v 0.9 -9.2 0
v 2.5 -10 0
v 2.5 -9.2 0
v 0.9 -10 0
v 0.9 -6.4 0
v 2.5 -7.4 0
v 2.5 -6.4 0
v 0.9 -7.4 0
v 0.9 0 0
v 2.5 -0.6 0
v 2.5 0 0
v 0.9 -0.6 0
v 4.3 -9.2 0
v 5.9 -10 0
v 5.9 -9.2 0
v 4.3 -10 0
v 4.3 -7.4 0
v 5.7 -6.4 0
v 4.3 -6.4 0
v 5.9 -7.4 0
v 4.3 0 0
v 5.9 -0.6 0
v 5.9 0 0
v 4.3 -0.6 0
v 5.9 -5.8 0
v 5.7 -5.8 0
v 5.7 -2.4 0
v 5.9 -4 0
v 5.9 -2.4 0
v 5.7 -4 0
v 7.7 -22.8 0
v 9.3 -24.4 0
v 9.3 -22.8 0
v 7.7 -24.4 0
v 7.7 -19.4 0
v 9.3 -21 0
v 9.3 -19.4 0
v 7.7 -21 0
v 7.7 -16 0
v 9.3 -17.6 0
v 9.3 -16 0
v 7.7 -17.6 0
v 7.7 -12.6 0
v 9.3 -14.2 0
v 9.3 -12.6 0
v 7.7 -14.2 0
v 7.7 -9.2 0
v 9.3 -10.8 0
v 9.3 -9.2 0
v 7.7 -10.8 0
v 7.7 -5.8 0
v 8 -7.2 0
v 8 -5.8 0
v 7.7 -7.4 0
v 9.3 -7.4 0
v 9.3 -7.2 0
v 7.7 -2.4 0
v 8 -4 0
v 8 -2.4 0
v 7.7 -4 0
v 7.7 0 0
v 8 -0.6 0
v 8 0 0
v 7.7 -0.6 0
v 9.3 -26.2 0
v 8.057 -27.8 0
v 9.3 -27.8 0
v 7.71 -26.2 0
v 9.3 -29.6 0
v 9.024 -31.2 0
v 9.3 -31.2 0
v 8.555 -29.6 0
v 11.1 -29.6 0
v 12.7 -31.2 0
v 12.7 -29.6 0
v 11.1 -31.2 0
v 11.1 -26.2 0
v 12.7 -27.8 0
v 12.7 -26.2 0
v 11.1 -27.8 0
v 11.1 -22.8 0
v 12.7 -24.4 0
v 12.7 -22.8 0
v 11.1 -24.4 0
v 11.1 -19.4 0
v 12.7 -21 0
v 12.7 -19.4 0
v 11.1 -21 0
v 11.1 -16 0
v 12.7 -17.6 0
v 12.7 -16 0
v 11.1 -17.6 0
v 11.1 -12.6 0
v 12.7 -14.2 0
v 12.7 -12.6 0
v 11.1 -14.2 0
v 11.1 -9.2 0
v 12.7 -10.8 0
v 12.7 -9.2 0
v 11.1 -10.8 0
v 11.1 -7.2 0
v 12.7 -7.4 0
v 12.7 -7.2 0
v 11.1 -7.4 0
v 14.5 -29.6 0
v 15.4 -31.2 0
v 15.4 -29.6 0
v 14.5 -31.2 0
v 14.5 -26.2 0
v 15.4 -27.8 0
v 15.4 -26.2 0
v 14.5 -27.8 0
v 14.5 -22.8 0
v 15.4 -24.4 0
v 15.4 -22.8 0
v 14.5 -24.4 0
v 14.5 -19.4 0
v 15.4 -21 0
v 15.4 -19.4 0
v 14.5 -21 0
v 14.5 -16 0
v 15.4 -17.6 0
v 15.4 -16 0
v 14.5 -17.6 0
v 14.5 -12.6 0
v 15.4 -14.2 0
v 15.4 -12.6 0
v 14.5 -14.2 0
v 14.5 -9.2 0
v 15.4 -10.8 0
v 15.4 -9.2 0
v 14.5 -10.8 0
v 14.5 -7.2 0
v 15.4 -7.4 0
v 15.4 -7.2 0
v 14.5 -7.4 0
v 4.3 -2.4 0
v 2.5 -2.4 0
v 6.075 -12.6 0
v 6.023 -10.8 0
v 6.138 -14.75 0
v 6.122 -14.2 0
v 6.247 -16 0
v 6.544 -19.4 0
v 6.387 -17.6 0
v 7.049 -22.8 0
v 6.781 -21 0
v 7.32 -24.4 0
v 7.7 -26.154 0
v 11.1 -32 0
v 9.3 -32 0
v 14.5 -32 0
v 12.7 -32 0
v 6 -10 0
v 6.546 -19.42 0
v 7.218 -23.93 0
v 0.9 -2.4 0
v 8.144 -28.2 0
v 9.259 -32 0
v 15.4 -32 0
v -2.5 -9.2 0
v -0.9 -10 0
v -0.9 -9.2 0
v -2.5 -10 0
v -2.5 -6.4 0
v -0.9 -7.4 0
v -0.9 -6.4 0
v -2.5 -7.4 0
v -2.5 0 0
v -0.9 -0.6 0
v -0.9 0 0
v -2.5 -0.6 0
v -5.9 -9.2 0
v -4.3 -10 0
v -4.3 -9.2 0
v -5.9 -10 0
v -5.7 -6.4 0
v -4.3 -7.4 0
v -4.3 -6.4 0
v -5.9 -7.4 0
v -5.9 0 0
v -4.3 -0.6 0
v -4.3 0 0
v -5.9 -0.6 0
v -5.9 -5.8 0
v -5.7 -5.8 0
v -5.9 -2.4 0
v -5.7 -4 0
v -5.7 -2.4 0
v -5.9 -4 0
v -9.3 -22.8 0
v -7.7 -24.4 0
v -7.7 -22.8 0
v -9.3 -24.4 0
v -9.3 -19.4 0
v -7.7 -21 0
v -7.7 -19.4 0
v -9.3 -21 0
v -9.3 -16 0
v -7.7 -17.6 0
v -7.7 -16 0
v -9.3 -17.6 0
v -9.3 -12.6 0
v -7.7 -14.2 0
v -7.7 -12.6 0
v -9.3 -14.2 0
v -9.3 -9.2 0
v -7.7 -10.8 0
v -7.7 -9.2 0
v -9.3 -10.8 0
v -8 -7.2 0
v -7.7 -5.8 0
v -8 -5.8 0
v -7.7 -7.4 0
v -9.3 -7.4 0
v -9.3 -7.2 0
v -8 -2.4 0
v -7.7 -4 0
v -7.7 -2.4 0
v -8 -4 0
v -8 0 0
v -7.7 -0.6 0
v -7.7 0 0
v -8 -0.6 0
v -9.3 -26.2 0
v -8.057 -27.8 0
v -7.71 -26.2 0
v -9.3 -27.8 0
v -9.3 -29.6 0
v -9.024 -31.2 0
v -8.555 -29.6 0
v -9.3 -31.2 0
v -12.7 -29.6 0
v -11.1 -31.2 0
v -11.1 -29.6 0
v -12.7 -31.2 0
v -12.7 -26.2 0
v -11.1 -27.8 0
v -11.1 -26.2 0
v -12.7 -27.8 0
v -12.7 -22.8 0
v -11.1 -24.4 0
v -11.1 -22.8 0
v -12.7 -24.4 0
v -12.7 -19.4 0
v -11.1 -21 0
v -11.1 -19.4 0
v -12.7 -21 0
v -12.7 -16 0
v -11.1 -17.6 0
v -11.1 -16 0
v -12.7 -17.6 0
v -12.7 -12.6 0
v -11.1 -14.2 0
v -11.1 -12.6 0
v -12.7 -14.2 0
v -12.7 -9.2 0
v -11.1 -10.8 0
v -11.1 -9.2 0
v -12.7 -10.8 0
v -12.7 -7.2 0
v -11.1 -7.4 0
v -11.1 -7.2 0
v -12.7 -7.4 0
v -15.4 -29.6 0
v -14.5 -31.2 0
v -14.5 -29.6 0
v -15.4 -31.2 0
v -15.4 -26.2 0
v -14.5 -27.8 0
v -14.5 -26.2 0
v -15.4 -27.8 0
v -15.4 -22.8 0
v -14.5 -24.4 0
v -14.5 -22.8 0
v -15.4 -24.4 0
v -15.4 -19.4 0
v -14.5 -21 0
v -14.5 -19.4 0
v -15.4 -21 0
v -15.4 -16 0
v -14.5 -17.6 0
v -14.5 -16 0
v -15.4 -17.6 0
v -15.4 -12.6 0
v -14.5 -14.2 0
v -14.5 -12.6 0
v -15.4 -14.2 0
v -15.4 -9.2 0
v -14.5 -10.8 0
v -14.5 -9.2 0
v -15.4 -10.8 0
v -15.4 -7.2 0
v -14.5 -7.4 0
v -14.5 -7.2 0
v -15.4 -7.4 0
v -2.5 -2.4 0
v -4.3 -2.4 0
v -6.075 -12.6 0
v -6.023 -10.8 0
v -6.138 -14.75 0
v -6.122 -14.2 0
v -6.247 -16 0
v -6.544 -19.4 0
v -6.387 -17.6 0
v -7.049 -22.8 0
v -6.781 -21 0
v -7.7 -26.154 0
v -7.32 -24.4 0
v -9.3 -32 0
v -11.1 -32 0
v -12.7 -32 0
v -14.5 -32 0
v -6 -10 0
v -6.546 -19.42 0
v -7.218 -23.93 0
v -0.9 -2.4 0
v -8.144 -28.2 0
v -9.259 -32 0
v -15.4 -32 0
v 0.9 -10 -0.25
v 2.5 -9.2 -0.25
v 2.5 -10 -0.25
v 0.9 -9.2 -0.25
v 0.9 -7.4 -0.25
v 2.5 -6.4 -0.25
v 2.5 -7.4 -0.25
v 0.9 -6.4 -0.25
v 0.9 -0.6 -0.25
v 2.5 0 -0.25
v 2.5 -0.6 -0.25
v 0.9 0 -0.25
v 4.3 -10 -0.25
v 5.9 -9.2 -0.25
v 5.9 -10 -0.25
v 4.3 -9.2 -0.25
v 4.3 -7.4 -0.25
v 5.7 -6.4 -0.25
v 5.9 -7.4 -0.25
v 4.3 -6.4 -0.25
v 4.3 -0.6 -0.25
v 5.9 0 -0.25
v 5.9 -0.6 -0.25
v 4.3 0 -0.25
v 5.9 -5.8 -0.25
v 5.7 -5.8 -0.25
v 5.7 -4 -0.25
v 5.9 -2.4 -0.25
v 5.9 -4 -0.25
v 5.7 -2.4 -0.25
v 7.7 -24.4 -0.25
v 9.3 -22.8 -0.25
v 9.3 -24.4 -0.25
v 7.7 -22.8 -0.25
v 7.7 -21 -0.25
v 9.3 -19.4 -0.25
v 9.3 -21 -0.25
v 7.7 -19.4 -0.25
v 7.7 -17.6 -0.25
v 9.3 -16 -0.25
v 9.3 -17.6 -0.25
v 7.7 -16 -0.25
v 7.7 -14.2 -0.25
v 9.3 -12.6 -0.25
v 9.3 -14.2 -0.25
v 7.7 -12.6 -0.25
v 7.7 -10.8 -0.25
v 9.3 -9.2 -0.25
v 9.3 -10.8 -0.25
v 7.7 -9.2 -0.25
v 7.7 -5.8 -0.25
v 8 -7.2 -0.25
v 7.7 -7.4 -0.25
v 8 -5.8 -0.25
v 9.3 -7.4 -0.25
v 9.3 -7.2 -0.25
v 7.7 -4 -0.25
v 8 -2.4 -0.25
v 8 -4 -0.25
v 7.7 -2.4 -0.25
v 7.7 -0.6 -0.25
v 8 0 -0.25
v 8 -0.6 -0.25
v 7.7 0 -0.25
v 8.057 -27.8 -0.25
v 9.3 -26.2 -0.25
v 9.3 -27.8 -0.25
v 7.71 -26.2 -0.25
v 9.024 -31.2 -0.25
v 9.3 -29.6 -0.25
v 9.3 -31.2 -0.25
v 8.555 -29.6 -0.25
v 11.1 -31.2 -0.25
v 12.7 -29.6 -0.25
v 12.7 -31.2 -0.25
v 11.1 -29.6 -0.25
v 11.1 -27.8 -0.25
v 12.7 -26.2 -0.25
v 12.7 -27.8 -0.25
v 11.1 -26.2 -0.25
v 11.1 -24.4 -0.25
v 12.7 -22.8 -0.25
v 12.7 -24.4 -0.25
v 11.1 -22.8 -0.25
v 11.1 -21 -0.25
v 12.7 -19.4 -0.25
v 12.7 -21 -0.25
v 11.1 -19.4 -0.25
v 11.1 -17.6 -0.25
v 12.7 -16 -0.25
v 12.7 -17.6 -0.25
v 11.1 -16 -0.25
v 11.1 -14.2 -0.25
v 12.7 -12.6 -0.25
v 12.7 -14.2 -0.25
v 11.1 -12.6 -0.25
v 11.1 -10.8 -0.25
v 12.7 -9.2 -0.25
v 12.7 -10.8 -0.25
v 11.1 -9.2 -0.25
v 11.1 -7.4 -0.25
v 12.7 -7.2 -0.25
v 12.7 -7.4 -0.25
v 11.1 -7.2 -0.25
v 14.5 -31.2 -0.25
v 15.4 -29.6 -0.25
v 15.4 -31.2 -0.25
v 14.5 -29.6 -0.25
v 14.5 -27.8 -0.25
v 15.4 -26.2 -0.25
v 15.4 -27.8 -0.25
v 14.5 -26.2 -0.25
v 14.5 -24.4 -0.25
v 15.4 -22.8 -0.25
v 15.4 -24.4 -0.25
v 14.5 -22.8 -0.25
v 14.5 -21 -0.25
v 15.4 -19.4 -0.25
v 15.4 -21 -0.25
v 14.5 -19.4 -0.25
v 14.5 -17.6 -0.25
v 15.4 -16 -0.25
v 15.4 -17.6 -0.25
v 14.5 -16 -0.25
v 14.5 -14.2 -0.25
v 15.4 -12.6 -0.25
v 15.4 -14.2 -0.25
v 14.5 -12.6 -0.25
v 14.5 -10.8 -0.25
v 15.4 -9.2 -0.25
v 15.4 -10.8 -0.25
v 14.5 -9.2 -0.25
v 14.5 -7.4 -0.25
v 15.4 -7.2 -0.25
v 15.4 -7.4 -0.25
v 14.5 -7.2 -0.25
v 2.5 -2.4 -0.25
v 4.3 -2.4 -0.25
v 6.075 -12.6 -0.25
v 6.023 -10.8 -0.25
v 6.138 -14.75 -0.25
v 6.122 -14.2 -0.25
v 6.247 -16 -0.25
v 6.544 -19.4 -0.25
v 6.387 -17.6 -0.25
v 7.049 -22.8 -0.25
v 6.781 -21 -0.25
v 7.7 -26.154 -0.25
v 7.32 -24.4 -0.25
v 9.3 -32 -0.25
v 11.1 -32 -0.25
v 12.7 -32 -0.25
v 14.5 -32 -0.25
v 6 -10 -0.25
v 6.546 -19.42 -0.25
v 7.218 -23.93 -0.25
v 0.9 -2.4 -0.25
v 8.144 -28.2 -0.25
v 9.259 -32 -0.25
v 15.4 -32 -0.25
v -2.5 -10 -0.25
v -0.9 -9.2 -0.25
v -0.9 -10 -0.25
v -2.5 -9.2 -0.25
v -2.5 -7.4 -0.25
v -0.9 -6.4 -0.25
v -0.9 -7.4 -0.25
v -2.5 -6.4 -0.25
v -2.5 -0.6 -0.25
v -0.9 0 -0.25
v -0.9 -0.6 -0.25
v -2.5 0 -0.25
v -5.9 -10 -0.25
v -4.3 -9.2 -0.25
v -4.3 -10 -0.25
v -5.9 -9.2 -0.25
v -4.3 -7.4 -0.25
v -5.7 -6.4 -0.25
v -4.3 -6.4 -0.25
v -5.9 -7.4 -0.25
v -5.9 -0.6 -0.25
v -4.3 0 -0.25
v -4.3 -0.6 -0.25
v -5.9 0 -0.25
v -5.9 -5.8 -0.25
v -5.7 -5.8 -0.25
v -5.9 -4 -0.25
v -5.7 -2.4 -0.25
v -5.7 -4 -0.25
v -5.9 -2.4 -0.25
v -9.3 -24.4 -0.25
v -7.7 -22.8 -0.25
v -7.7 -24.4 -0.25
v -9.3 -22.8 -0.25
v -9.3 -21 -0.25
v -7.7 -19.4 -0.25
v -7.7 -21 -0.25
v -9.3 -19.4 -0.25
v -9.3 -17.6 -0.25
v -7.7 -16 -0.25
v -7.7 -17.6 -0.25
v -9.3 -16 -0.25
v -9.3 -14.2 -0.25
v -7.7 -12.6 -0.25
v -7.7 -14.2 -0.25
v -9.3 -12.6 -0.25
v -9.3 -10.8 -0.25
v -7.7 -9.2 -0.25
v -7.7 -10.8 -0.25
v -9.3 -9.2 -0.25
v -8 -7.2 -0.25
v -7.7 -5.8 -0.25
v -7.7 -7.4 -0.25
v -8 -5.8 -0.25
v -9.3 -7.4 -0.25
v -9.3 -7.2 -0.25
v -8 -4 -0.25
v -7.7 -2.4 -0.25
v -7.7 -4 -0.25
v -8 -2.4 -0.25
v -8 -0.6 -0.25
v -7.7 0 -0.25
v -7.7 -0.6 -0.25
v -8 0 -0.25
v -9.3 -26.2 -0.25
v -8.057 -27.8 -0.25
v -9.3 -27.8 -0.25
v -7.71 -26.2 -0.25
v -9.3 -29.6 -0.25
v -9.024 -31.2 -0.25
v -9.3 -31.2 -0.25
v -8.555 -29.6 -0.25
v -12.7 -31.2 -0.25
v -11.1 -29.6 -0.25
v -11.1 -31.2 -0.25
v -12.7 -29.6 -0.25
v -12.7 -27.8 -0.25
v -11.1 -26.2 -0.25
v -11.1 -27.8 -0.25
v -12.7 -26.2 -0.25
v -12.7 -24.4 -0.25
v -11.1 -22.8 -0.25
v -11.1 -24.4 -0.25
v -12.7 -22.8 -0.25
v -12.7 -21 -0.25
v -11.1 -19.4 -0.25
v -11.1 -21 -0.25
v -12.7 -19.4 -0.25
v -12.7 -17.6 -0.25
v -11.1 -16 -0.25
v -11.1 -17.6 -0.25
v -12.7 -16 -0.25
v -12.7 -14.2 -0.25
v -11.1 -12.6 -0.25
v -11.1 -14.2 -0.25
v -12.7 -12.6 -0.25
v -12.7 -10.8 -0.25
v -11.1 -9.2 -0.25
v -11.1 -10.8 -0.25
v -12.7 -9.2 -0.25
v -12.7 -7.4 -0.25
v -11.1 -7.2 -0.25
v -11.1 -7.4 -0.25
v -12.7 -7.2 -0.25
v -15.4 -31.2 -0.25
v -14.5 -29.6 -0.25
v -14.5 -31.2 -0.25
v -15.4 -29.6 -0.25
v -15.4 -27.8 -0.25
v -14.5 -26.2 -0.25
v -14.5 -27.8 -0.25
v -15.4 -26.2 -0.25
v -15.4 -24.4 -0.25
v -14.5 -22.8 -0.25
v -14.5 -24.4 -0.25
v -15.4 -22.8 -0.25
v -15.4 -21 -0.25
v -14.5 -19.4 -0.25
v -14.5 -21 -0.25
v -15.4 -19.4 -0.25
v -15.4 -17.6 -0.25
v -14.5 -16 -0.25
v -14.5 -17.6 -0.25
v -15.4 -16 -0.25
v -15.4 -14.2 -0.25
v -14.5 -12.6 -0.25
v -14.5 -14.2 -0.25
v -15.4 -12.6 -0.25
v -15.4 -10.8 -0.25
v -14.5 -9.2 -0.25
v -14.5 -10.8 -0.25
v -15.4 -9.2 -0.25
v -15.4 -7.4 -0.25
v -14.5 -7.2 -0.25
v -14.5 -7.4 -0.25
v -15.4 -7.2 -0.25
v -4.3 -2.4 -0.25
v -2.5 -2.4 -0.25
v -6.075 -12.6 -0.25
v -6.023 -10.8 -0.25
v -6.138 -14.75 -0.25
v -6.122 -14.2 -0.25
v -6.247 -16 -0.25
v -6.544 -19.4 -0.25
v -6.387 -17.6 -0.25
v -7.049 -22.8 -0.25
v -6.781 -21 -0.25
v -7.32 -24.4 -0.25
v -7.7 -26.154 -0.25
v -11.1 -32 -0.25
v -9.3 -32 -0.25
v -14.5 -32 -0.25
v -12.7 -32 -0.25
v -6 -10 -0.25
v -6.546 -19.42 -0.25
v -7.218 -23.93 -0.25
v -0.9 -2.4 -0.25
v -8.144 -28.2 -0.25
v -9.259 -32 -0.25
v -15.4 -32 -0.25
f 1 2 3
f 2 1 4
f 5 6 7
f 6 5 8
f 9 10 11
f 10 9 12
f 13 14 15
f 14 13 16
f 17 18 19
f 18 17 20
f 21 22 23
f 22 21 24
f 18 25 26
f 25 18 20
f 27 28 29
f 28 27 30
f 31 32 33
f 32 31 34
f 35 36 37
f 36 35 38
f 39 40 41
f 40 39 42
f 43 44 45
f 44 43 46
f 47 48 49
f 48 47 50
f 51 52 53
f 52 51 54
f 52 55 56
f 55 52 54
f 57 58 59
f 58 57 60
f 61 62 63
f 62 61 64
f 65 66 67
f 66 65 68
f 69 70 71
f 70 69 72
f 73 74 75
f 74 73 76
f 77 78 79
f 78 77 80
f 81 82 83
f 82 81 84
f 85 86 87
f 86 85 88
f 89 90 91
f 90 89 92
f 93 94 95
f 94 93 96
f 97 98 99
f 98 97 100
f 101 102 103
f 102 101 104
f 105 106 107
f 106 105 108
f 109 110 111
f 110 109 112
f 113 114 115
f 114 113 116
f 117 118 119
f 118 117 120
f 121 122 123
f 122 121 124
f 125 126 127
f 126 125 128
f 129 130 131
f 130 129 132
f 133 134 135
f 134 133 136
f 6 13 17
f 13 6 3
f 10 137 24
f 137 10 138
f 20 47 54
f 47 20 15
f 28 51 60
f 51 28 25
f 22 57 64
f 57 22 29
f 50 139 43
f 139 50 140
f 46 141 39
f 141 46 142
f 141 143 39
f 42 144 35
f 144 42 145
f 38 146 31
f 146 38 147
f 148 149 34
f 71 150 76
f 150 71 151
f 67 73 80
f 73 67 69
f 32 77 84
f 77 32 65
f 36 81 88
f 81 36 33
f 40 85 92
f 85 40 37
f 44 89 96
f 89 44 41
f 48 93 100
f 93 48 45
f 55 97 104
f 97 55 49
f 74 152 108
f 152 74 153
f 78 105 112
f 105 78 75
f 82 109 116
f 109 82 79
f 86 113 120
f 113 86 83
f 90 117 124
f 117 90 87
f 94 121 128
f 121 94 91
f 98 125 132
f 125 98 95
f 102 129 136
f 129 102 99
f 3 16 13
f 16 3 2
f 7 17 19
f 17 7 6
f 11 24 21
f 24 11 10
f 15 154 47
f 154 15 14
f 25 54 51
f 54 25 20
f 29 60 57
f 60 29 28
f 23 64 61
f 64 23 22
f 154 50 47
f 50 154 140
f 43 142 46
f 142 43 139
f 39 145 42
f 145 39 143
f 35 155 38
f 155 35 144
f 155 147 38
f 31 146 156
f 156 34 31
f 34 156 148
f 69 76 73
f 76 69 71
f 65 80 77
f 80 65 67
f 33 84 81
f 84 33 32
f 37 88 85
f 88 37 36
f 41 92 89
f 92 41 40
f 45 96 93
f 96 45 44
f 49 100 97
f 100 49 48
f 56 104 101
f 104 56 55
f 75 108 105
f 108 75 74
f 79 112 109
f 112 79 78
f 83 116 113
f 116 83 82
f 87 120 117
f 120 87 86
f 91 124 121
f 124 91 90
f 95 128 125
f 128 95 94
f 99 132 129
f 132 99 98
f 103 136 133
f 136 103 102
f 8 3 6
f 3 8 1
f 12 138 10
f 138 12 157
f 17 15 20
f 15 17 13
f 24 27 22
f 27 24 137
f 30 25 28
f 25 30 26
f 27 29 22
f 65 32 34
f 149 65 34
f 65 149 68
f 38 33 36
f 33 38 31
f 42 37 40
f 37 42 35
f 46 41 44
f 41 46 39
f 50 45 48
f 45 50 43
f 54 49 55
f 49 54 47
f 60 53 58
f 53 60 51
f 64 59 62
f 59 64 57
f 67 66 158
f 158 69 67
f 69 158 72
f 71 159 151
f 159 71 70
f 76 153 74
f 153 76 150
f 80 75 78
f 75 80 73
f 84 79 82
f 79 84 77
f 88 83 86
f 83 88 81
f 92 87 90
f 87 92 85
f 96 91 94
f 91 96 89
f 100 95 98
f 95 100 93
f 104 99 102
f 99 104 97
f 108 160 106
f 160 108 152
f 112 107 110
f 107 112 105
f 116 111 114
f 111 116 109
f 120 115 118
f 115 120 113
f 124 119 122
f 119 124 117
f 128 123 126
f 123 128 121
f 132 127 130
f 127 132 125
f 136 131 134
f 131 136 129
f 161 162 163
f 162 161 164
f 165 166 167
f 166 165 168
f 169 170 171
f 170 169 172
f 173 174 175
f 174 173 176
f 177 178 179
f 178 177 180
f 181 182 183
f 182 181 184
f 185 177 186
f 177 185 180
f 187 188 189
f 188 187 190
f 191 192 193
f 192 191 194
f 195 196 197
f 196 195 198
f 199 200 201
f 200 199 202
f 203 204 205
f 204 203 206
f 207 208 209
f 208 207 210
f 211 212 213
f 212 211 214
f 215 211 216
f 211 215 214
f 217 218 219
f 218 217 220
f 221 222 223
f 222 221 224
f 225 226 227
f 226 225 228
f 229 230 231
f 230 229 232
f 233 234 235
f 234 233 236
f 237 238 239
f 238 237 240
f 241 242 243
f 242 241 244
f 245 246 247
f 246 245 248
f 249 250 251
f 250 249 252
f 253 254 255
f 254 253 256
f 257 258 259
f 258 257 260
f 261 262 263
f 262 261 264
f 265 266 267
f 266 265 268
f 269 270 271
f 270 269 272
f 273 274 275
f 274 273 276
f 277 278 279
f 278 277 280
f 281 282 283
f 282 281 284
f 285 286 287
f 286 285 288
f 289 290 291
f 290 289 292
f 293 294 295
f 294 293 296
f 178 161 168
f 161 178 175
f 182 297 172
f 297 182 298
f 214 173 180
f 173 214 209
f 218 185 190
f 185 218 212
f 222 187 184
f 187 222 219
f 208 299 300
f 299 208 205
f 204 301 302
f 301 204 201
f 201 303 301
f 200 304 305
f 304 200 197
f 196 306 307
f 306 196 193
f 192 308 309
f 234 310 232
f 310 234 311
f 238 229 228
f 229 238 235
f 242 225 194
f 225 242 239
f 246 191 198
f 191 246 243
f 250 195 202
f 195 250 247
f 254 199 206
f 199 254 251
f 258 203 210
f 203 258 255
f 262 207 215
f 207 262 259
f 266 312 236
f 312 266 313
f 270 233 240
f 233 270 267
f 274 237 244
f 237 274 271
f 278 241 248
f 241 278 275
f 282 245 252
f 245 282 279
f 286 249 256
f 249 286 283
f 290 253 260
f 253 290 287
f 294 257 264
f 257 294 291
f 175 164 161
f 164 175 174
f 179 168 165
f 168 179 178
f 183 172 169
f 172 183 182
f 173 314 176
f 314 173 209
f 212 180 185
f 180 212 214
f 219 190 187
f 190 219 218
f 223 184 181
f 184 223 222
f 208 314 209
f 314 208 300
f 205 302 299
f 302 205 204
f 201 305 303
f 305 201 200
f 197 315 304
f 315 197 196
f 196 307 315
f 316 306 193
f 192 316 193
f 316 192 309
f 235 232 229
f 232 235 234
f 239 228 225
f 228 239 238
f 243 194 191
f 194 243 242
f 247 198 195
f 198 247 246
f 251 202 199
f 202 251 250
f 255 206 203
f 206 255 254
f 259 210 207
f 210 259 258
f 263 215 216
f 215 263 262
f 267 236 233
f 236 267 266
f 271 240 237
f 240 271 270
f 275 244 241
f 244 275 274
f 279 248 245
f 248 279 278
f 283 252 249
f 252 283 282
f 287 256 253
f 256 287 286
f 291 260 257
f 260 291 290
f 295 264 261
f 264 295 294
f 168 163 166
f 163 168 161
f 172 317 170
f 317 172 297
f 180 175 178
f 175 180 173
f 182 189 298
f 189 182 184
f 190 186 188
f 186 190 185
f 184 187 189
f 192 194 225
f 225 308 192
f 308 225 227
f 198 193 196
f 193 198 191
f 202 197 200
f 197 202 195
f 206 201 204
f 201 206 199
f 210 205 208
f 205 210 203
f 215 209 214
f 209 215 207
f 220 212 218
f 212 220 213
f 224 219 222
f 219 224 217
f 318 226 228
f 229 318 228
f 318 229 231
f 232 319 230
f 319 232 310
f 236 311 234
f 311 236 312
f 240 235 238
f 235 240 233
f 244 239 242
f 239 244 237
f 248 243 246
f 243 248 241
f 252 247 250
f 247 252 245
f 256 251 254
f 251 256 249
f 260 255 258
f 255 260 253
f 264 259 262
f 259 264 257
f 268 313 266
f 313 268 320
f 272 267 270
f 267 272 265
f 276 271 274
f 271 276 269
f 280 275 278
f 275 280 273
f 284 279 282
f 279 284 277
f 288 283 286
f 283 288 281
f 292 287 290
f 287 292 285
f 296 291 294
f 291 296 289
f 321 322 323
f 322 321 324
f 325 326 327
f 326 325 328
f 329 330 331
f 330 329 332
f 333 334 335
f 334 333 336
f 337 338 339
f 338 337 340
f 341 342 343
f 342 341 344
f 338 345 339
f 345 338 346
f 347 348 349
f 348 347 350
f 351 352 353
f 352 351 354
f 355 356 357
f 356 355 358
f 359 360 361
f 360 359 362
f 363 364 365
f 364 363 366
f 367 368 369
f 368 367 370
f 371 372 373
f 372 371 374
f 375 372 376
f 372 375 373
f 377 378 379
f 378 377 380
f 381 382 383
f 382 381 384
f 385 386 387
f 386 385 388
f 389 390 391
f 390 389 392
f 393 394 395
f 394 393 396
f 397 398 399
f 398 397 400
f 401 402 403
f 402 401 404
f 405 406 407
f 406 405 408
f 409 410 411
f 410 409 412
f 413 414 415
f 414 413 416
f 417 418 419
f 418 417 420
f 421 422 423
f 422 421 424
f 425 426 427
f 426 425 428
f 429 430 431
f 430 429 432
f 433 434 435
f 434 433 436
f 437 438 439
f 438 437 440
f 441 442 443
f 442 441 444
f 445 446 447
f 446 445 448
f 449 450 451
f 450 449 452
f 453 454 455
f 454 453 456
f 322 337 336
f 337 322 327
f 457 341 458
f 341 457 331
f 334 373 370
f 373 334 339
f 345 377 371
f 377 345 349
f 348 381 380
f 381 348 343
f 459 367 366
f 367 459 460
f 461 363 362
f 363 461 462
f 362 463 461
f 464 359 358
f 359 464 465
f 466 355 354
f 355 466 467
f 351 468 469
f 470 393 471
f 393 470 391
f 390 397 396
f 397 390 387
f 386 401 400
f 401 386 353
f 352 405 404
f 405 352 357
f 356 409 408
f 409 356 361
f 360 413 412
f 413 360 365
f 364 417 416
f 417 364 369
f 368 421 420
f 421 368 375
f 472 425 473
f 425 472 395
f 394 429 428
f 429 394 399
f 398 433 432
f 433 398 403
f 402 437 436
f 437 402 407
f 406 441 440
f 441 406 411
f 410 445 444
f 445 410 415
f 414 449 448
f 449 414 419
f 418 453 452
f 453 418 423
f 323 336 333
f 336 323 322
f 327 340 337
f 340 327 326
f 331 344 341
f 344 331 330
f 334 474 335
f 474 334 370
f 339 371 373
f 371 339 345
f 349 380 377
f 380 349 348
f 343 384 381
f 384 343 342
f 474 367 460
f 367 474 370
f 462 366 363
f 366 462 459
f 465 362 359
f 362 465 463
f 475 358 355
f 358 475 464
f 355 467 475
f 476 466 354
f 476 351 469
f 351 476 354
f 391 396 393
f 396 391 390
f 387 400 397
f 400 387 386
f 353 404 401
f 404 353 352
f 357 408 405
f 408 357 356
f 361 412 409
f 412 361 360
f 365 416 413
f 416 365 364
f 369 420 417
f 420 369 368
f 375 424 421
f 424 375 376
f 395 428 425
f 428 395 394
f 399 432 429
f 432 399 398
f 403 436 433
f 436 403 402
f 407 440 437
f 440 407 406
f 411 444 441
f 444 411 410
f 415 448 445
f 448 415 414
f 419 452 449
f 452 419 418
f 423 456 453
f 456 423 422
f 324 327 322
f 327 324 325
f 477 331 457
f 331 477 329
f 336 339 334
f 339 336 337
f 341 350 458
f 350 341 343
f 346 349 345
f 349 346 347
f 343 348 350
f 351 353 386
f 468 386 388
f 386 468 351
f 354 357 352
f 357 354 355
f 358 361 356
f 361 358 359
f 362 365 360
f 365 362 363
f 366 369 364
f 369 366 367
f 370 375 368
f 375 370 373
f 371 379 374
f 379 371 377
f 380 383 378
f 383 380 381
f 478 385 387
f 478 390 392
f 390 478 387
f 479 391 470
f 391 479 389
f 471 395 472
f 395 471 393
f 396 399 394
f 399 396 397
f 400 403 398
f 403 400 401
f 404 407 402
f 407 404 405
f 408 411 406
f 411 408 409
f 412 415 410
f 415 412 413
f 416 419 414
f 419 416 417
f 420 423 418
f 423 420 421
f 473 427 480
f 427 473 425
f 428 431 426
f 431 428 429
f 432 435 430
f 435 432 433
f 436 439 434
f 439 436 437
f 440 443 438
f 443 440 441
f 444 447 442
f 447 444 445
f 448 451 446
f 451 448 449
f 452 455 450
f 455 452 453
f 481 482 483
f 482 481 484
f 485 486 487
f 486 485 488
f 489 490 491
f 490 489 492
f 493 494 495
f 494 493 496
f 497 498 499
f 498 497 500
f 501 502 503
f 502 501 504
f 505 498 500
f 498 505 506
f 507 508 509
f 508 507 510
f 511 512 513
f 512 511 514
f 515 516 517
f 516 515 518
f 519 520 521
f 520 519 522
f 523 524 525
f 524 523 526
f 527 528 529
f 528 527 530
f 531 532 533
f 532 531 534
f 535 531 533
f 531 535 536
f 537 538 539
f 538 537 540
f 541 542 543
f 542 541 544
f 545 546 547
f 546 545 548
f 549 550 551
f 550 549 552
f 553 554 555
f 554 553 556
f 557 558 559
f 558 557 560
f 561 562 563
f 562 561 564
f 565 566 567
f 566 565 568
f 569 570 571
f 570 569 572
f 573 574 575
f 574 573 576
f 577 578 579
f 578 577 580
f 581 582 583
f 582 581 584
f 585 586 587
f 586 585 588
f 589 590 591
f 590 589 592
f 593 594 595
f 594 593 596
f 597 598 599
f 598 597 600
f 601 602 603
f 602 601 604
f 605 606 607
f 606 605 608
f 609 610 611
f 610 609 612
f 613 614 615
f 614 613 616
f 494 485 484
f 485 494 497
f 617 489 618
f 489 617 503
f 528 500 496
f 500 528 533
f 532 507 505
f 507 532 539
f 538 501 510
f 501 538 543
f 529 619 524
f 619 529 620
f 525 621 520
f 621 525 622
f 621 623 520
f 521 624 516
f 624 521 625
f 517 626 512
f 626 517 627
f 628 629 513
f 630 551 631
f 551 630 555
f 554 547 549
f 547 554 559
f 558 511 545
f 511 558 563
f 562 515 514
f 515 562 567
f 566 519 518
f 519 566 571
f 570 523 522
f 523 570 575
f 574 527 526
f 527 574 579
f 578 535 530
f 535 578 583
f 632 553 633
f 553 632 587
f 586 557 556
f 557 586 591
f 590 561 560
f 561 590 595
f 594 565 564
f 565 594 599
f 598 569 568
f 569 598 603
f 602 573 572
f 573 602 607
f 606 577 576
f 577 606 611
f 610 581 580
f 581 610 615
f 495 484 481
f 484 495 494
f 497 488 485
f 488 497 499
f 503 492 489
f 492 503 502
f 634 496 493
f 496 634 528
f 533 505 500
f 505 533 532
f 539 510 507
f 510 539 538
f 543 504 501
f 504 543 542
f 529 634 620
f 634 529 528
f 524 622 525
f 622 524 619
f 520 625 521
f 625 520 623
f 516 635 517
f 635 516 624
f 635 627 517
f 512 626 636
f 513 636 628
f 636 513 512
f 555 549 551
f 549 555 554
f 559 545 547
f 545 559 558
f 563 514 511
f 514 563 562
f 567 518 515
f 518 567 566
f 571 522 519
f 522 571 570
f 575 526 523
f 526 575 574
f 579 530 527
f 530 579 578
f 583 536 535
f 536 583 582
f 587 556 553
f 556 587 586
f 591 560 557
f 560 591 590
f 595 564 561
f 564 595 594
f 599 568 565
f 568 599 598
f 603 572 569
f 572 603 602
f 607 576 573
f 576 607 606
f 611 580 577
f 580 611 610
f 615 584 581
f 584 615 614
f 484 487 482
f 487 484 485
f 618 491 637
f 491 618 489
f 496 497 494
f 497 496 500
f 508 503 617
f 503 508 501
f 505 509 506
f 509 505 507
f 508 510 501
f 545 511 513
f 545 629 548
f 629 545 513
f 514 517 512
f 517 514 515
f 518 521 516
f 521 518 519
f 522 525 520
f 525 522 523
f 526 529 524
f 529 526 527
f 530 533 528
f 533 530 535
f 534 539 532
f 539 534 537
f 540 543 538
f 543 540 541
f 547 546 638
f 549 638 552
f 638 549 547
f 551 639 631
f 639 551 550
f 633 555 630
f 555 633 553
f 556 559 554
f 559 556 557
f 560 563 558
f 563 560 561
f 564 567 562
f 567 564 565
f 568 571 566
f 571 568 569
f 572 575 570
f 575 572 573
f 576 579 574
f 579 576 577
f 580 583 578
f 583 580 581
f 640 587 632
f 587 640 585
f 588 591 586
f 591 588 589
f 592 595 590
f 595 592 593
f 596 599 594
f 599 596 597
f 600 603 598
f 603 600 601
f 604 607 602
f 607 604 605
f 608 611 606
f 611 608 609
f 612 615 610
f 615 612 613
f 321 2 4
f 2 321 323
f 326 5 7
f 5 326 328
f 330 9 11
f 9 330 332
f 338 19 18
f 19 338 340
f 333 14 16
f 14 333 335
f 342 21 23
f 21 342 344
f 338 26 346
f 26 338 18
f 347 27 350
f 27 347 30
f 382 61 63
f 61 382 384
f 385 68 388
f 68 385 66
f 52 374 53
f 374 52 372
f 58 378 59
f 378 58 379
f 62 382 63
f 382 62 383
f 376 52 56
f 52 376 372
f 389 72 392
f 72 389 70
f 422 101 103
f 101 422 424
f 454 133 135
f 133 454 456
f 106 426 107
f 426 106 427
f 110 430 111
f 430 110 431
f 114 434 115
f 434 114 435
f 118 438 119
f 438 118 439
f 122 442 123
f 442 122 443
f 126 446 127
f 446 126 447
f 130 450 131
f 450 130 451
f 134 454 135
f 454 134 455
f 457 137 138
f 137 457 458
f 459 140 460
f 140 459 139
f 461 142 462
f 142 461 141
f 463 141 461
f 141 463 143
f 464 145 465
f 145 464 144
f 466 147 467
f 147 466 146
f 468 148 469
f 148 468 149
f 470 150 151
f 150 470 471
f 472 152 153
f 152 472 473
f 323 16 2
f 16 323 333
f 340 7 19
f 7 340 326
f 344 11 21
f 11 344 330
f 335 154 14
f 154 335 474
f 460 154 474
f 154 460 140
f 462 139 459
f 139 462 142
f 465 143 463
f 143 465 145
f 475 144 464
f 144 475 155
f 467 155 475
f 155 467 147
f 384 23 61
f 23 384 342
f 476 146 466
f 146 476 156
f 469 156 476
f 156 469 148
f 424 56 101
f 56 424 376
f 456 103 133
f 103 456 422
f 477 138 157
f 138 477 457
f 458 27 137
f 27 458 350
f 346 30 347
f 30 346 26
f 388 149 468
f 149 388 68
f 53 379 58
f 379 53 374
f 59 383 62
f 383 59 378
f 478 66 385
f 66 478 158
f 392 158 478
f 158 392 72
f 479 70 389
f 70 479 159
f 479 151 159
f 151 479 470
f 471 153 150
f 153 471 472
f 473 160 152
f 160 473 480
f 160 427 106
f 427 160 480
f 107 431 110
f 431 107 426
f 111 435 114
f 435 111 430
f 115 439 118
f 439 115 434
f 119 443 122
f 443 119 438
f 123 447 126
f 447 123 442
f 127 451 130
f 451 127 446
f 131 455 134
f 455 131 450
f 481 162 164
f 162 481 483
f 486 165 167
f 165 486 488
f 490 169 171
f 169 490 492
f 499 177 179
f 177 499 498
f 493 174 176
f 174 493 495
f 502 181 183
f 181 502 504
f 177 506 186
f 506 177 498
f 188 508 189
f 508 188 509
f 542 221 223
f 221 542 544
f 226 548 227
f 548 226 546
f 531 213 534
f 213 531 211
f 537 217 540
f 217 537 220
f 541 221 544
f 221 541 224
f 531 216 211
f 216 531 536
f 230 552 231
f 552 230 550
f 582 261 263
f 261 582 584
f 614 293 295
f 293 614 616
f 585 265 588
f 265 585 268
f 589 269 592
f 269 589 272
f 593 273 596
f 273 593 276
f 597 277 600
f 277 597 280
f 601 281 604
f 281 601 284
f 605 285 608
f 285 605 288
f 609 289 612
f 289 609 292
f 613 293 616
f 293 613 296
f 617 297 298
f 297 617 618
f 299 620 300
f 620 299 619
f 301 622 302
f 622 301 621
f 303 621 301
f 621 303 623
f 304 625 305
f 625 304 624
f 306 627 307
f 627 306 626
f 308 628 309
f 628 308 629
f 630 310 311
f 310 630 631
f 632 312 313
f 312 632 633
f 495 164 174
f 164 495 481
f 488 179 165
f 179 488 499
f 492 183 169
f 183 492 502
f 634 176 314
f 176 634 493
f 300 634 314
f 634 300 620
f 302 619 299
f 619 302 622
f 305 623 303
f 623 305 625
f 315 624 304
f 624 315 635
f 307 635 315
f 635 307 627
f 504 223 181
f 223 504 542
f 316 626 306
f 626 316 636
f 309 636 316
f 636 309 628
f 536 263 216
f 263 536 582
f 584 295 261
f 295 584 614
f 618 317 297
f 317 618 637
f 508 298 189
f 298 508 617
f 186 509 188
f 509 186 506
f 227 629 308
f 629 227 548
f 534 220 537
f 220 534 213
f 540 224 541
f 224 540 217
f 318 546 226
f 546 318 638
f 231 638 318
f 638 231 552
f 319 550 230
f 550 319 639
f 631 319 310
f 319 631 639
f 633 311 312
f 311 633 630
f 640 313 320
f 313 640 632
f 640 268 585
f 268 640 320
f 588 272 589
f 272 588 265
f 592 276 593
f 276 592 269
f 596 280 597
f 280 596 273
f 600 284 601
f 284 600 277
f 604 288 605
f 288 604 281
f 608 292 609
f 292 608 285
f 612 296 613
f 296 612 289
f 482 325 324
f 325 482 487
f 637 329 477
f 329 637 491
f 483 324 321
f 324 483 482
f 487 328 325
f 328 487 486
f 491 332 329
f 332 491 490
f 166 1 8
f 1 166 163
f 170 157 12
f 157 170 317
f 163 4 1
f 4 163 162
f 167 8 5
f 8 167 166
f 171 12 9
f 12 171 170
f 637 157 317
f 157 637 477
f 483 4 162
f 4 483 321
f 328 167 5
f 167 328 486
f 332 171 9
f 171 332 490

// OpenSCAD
// file: ../p/rect3.scad
use <../lib.scad>
function ldraw_lib__rect3() = [
// 0 Rectangle with 3 Edges
// 0 Name: rect3.dat
// 0 Author: Mark Kennedy [mkennedy]
// 0 !LDRAW_ORG Primitive UPDATE 2010-01
// 0 !LICENSE Licensed under CC BY 4.0 : see CAreadme.txt
// 
// 0 BFC CERTIFY CCW
  [0,"BFC","CERTIFY"],
  [0,"BFC","CCW"],
// 
// 0 !HISTORY 2003-08-01 [PTadmin] Official Update 2003-02
// 0 !HISTORY 2007-06-24 [PTadmin] Header formatted for Contributor Agreement
// 0 !HISTORY 2008-07-01 [PTadmin] Official Update 2008-01
// 0 !HISTORY 2010-01-17 [mikeheide] Change winding to CCW
// 0 !HISTORY 2010-04-05 [PTadmin] Official Update 2010-01
// 
// 
// 2 24 1 0 1 -1 0 1
  [2,24,1,0,1,-1,0,1],
// 2 24 1 0 1 1 0 -1
  [2,24,1,0,1,1,0,-1],
// 2 24 -1 0 1 -1 0 -1
  [2,24,-1,0,1,-1,0,-1],
// 4 16 -1 0 1 -1 0 -1 1 0 -1 1 0 1
  [4,16,-1,0,1,-1,0,-1,1,0,-1,1,0,1],
// 0 //
];
module ldraw_lib__rect3(step=0, col=false, unit=2/5, alt=false, line=0.2, solid=!$preview)
    makepoly(ldraw_lib__rect3(), step=step, col=col, unit=unit, alt=alt, line=line, solid=solid);
ldraw_lib__rect3(line=0.2);
// file: ../p/rect2p.scad
use <../lib.scad>
function ldraw_lib__rect2p() = [
// 0 Rectangle with 2 Parallel Edges
// 0 Name: rect2p.dat
// 0 Author: Donald Sutter [technog]
// 0 !LDRAW_ORG Primitive UPDATE 2010-01
// 0 !LICENSE Licensed under CC BY 4.0 : see CAreadme.txt
// 
// 0 BFC CERTIFY CCW
  [0,"BFC","CERTIFY"],
  [0,"BFC","CCW"],
// 
// 0 !HISTORY 2003-08-01 [PTadmin] Official Update 2003-02
// 0 !HISTORY 2007-06-24 [PTadmin] Header formatted for Contributor Agreement
// 0 !HISTORY 2008-07-01 [PTadmin] Official Update 2008-01
// 0 !HISTORY 2010-01-17 [mikeheide] changed winding to CCW
// 0 !HISTORY 2010-04-05 [PTadmin] Official Update 2010-01
// 
// 
// 2 24 1 0 1 -1 0 1
  [2,24,1,0,1,-1,0,1],
// 2 24 -1 0 -1 1 0 -1
  [2,24,-1,0,-1,1,0,-1],
// 4 16 -1 0 1 -1 0 -1 1 0 -1 1 0 1
  [4,16,-1,0,1,-1,0,-1,1,0,-1,1,0,1],
// 0
];
module ldraw_lib__rect2p(step=0, col=false, unit=2/5, alt=false, line=0.2, solid=!$preview)
    makepoly(ldraw_lib__rect2p(), step=step, col=col, unit=unit, alt=alt, line=line, solid=solid);
ldraw_lib__rect2p(line=0.2);
// main file
use <../lib.scad>
use <../p/rect2p.scad>
use <s/97122s01.scad>
use <s/97122s02.scad>
function ldraw_lib__97122() = [
// 0 Sheet Fabric Curtain for Window  1 x  4 x  3 with Red/Green/Medium Brown Plaid Pattern
// 0 Name: 97122.dat
// 0 Author: Max Martin Richter [MMR1988]
// 0 !LDRAW_ORG Part UPDATE 2020-01
// 0 !LICENSE Licensed under CC BY 4.0 : see CAreadme.txt
// 
// 0 BFC CERTIFY CCW
  [0,"BFC","CERTIFY"],
  [0,"BFC","CCW"],
// 
// 0 !CATEGORY Sheet Fabric
// 0 !KEYWORDS camper van, T1, Transporter, van, Volkswagen, VW, VW Camper
// 
// 0 !HISTORY 2018-12-08 [PTadmin] Official Update 2018-02
// 0 !HISTORY 2019-01-25 [cwdee] Update category
// 0 !HISTORY 2019-06-28 [PTadmin] Official Update 2019-01
// 0 !HISTORY 2020-05-10 [cwdee] Update colour name in description
// 0 !HISTORY 2020-06-28 [PTadmin] Official Update 2020-01
// 
// 
// 1 16 0 0 0 1 0 0 0 1 0 0 0 1 s\97122s01.dat
  [1,16,0,0,0,1,0,0,0,1,0,0,0,1, ldraw_lib__s__97122s01()],
// 1 16 0 0 0 -1 0 0 0 1 0 0 0 1 s\97122s01.dat
  [1,16,0,0,0,-1,0,0,0,1,0,0,0,1, ldraw_lib__s__97122s01()],
// 1 16 0 0.625 0 1 0 0 0 -1 0 0 0 1 s\97122s01.dat
  [1,16,0,0.625,0,1,0,0,0,-1,0,0,0,1, ldraw_lib__s__97122s01()],
// 1 16 0 0.625 0 -1 0 0 0 -1 0 0 0 1 s\97122s01.dat
  [1,16,0,0.625,0,-1,0,0,0,-1,0,0,0,1, ldraw_lib__s__97122s01()],
// 
// 1 16 0 0 0 1 0 0 0 1 0 0 0 1 s\97122s02.dat
  [1,16,0,0,0,1,0,0,0,1,0,0,0,1, ldraw_lib__s__97122s02()],
// 1 16 0 0 0 -1 0 0 0 1 0 0 0 1 s\97122s02.dat
  [1,16,0,0,0,-1,0,0,0,1,0,0,0,1, ldraw_lib__s__97122s02()],
// 
// 4 4 -2.25 0.625 -18.5 2.25 0.625 -18.5 2.25 0.625 -23 -2.25 0.625 -23
  [4,4,-2.25,0.625,-18.5,2.25,0.625,-18.5,2.25,0.625,-23,-2.25,0.625,-23],
// 4 4 -2.25 0.625 -1.5 2.25 0.625 -1.5 2.25 0.625 -6 -2.25 0.625 -6
  [4,4,-2.25,0.625,-1.5,2.25,0.625,-1.5,2.25,0.625,-6,-2.25,0.625,-6],
// 4 16 2.25 0.625 -25 -2.25 0.625 -25 -2.25 0.625 -23 2.25 0.625 -23
  [4,16,2.25,0.625,-25,-2.25,0.625,-25,-2.25,0.625,-23,2.25,0.625,-23],
// 4 16 -2.25 0.625 -16 2.25 0.625 -16 2.25 0.625 -18.5 -2.25 0.625 -18.5
  [4,16,-2.25,0.625,-16,2.25,0.625,-16,2.25,0.625,-18.5,-2.25,0.625,-18.5],
// 4 16 -2.25 0.625 0 2.25 0.625 0 2.25 0.625 -1.5 -2.25 0.625 -1.5
  [4,16,-2.25,0.625,0,2.25,0.625,0,2.25,0.625,-1.5,-2.25,0.625,-1.5],
// 
// 4 4 -2.25 0 -23 2.25 0 -23 2.25 0 -18.5 -2.25 0 -18.5
  [4,4,-2.25,0,-23,2.25,0,-23,2.25,0,-18.5,-2.25,0,-18.5],
// 4 4 -2.25 0 -6 2.25 0 -6 2.25 0 -1.5 -2.25 0 -1.5
  [4,4,-2.25,0,-6,2.25,0,-6,2.25,0,-1.5,-2.25,0,-1.5],
// 4 16 2.25 0 -23 -2.25 0 -23 -2.25 0 -25 2.25 0 -25
  [4,16,2.25,0,-23,-2.25,0,-23,-2.25,0,-25,2.25,0,-25],
// 4 16 -2.25 0 -18.5 2.25 0 -18.5 2.25 0 -16 -2.25 0 -16
  [4,16,-2.25,0,-18.5,2.25,0,-18.5,2.25,0,-16,-2.25,0,-16],
// 4 16 -2.25 0 -1.5 2.25 0 -1.5 2.25 0 0 -2.25 0 0
  [4,16,-2.25,0,-1.5,2.25,0,-1.5,2.25,0,0,-2.25,0,0],
// 
// 1 4 0 0.3125 -6 -2.25 0 0 0 0 0.3125 0 1 0 rect2p.dat
  [1,4,0,0.3125,-6,-2.25,0,0,0,0,0.3125,0,1,0, ldraw_lib__rect2p()],
// 1 16 0 0.3125 -25 -2.25 0 0 0 0 0.3125 0 1 0 rect2p.dat
  [1,16,0,0.3125,-25,-2.25,0,0,0,0,0.3125,0,1,0, ldraw_lib__rect2p()],
// 1 16 0 0.3125 -16 2.25 0 0 0 0 0.3125 0 -1 0 rect2p.dat
  [1,16,0,0.3125,-16,2.25,0,0,0,0,0.3125,0,-1,0, ldraw_lib__rect2p()],
// 1 16 0 0.3125 0 2.25 0 0 0 0 0.3125 0 -1 0 rect2p.dat
  [1,16,0,0.3125,0,2.25,0,0,0,0,0.3125,0,-1,0, ldraw_lib__rect2p()],
];
module ldraw_lib__97122(step=0, col=false, unit=2/5, alt=false, line=0.2, solid=!$preview)
    makepoly(ldraw_lib__97122(), step=step, col=col, unit=unit, alt=alt, line=line, solid=solid);
ldraw_lib__97122(line=0.2);
